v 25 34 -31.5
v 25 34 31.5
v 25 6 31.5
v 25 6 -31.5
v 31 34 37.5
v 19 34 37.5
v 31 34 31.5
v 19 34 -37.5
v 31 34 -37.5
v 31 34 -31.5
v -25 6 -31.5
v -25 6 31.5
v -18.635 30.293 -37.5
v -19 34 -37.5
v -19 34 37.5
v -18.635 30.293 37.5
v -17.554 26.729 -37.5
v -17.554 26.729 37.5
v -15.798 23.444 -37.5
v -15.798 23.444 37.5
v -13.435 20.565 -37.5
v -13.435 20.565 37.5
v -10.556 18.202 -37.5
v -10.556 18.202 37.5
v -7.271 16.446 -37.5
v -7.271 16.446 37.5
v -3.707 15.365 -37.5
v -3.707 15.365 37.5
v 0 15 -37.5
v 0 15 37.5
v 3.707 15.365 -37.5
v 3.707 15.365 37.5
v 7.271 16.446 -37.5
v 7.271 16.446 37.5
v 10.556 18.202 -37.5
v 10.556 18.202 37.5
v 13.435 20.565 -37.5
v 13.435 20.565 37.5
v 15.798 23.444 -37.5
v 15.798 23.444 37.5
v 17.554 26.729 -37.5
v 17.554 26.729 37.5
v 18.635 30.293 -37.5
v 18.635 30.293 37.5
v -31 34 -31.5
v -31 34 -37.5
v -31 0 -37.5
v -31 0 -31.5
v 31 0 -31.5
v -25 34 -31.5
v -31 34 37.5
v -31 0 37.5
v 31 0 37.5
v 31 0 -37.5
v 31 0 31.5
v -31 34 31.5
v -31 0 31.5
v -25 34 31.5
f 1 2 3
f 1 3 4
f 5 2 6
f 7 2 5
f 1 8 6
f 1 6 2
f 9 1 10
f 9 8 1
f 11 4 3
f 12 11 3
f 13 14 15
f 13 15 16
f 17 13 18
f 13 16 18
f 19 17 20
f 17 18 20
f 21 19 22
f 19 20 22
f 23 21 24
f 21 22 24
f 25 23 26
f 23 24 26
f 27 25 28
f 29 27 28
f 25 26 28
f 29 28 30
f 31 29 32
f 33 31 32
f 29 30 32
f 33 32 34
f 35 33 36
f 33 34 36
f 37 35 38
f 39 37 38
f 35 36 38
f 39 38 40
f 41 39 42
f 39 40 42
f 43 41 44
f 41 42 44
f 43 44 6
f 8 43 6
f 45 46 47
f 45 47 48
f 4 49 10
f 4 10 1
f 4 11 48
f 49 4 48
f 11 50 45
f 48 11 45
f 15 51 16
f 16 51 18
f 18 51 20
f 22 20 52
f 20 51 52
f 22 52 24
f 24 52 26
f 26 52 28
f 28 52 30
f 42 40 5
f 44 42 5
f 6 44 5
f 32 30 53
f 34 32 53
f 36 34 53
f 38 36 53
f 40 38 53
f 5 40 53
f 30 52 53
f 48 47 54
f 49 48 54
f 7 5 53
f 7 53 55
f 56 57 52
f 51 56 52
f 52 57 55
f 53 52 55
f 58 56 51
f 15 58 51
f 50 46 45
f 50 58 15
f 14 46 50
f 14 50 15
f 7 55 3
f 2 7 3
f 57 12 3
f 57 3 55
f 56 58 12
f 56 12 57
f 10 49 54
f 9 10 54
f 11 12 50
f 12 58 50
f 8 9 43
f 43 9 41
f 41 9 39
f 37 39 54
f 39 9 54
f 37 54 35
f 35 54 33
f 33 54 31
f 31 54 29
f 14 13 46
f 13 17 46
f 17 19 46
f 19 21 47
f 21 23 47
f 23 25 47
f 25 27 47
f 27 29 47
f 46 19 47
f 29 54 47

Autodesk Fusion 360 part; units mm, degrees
sketch "Sketch1" plane through (0, 0, 0) normal (0, 1, 0) x (1, 0, 0)
  line L0 (31, 37.5) -> (-31, 37.5)
  line L1 (-31, 37.5) -> (-31, -37.5)
  line L2 (-31, -37.5) -> (31, -37.5)
  line L3 (31, -37.5) -> (31, 37.5)
extrude "Extrude1" add sketch "Sketch1" along normal blind 34
sketch "Sketch2" plane through (0, 0, 37.5) normal (0, 0, 1) x (-1, 0, 0)
  line L0 (31, 0) -> (-31, 0)
  line L1 (-31, 0) -> (-31, -34)
  line L2 (-31, -34) -> (31, -34)
  line L3 (31, -34) -> (31, 0)
  arc A0 (19, -34) -> (-19, -34) centre (0, -34) ccw
  line L4 (19, -34) -> (-19, -34)
  dimension "d7" = 38
extrude "Extrude2" cut sketch "Sketch2" against normal blind 75 contours L2 A0 L4
sketch "Sketch3" plane through (0, 34, 0) normal (0, 1, 0) x (-1, 0, 0)
  line L0 (19, 37.5) -> (19, -37.5)
  line L1 (19, -37.5) -> (31, -37.5)
  line L2 (31, -37.5) -> (31, 37.5)
  line L3 (31, 37.5) -> (19, 37.5)
  line L4 (31, -37.5) -> (31, -31.5)
  line L5 (31, -31.5) -> (25, -31.5)
  line L6 (31, 37.5) -> (31, 31.5)
  line L7 (31, 31.5) -> (25, 31.5)
  line L8 (25, 31.5) -> (25, -31.5)
  line L9 (0.133, -37.5) -> (0.133, 37.506)
  line L10 (-30.734, -31.5) -> (-24.734, -31.5)
  line L11 (-24.734, 31.5) -> (-24.734, -31.5)
  line L12 (-30.734, 31.5) -> (-24.734, 31.5)
  dimension "d10" = 6
  dimension "d11" = 6
  dimension "d12" = 6
  dimension "d13" = 6
extrude "Extrude3" cut sketch "Sketch3" against normal blind 34 contours L2 L5 L7 L8
sketch "Sketch4" plane through (0, 34, 0) normal (0, 1, 0) x (-1, 0, 0)
  line L0 (-19, -37.5) -> (-19, 37.5)
  line L1 (-19, 37.5) -> (-31, 37.5)
  line L2 (-31, 37.5) -> (-31, -37.5)
  line L3 (-31, -37.5) -> (-19, -37.5)
  line L4 (-31, -37.5) -> (-31, -31.5)
  line L5 (-31, -31.5) -> (-25, -31.5)
  line L6 (-31, 37.5) -> (-31, 31.5)
  line L7 (-31, 31.5) -> (-25, 31.5)
  line L8 (-25, 31.5) -> (-25, -31.5)
  dimension "d16" = 6
  dimension "d17" = 6
  dimension "d18" = 6
  dimension "d19" = 6
extrude "Extrude4" cut sketch "Sketch4" against normal blind 34 contours L2 L5 L7 L8
sketch "Sketch5" plane through (25, 0, 0) normal (1, 0, 0) x (0, 1, 0)
  line L0 (34, -31.5) -> (34, 31.5)
  line L1 (34, 31.5) -> (0, 31.5)
  line L2 (0, 31.5) -> (0, -31.5)
  line L3 (0, -31.5) -> (34, -31.5)
  line L4 (0, -31.5) -> (6, -31.5)
  line L5 (6, -31.5) -> (6, 31.5)
  dimension "d22" = 6
extrude "Extrude5" cut sketch "Sketch5" against normal blind 50 contours L1 L2 L3 L4 L5
